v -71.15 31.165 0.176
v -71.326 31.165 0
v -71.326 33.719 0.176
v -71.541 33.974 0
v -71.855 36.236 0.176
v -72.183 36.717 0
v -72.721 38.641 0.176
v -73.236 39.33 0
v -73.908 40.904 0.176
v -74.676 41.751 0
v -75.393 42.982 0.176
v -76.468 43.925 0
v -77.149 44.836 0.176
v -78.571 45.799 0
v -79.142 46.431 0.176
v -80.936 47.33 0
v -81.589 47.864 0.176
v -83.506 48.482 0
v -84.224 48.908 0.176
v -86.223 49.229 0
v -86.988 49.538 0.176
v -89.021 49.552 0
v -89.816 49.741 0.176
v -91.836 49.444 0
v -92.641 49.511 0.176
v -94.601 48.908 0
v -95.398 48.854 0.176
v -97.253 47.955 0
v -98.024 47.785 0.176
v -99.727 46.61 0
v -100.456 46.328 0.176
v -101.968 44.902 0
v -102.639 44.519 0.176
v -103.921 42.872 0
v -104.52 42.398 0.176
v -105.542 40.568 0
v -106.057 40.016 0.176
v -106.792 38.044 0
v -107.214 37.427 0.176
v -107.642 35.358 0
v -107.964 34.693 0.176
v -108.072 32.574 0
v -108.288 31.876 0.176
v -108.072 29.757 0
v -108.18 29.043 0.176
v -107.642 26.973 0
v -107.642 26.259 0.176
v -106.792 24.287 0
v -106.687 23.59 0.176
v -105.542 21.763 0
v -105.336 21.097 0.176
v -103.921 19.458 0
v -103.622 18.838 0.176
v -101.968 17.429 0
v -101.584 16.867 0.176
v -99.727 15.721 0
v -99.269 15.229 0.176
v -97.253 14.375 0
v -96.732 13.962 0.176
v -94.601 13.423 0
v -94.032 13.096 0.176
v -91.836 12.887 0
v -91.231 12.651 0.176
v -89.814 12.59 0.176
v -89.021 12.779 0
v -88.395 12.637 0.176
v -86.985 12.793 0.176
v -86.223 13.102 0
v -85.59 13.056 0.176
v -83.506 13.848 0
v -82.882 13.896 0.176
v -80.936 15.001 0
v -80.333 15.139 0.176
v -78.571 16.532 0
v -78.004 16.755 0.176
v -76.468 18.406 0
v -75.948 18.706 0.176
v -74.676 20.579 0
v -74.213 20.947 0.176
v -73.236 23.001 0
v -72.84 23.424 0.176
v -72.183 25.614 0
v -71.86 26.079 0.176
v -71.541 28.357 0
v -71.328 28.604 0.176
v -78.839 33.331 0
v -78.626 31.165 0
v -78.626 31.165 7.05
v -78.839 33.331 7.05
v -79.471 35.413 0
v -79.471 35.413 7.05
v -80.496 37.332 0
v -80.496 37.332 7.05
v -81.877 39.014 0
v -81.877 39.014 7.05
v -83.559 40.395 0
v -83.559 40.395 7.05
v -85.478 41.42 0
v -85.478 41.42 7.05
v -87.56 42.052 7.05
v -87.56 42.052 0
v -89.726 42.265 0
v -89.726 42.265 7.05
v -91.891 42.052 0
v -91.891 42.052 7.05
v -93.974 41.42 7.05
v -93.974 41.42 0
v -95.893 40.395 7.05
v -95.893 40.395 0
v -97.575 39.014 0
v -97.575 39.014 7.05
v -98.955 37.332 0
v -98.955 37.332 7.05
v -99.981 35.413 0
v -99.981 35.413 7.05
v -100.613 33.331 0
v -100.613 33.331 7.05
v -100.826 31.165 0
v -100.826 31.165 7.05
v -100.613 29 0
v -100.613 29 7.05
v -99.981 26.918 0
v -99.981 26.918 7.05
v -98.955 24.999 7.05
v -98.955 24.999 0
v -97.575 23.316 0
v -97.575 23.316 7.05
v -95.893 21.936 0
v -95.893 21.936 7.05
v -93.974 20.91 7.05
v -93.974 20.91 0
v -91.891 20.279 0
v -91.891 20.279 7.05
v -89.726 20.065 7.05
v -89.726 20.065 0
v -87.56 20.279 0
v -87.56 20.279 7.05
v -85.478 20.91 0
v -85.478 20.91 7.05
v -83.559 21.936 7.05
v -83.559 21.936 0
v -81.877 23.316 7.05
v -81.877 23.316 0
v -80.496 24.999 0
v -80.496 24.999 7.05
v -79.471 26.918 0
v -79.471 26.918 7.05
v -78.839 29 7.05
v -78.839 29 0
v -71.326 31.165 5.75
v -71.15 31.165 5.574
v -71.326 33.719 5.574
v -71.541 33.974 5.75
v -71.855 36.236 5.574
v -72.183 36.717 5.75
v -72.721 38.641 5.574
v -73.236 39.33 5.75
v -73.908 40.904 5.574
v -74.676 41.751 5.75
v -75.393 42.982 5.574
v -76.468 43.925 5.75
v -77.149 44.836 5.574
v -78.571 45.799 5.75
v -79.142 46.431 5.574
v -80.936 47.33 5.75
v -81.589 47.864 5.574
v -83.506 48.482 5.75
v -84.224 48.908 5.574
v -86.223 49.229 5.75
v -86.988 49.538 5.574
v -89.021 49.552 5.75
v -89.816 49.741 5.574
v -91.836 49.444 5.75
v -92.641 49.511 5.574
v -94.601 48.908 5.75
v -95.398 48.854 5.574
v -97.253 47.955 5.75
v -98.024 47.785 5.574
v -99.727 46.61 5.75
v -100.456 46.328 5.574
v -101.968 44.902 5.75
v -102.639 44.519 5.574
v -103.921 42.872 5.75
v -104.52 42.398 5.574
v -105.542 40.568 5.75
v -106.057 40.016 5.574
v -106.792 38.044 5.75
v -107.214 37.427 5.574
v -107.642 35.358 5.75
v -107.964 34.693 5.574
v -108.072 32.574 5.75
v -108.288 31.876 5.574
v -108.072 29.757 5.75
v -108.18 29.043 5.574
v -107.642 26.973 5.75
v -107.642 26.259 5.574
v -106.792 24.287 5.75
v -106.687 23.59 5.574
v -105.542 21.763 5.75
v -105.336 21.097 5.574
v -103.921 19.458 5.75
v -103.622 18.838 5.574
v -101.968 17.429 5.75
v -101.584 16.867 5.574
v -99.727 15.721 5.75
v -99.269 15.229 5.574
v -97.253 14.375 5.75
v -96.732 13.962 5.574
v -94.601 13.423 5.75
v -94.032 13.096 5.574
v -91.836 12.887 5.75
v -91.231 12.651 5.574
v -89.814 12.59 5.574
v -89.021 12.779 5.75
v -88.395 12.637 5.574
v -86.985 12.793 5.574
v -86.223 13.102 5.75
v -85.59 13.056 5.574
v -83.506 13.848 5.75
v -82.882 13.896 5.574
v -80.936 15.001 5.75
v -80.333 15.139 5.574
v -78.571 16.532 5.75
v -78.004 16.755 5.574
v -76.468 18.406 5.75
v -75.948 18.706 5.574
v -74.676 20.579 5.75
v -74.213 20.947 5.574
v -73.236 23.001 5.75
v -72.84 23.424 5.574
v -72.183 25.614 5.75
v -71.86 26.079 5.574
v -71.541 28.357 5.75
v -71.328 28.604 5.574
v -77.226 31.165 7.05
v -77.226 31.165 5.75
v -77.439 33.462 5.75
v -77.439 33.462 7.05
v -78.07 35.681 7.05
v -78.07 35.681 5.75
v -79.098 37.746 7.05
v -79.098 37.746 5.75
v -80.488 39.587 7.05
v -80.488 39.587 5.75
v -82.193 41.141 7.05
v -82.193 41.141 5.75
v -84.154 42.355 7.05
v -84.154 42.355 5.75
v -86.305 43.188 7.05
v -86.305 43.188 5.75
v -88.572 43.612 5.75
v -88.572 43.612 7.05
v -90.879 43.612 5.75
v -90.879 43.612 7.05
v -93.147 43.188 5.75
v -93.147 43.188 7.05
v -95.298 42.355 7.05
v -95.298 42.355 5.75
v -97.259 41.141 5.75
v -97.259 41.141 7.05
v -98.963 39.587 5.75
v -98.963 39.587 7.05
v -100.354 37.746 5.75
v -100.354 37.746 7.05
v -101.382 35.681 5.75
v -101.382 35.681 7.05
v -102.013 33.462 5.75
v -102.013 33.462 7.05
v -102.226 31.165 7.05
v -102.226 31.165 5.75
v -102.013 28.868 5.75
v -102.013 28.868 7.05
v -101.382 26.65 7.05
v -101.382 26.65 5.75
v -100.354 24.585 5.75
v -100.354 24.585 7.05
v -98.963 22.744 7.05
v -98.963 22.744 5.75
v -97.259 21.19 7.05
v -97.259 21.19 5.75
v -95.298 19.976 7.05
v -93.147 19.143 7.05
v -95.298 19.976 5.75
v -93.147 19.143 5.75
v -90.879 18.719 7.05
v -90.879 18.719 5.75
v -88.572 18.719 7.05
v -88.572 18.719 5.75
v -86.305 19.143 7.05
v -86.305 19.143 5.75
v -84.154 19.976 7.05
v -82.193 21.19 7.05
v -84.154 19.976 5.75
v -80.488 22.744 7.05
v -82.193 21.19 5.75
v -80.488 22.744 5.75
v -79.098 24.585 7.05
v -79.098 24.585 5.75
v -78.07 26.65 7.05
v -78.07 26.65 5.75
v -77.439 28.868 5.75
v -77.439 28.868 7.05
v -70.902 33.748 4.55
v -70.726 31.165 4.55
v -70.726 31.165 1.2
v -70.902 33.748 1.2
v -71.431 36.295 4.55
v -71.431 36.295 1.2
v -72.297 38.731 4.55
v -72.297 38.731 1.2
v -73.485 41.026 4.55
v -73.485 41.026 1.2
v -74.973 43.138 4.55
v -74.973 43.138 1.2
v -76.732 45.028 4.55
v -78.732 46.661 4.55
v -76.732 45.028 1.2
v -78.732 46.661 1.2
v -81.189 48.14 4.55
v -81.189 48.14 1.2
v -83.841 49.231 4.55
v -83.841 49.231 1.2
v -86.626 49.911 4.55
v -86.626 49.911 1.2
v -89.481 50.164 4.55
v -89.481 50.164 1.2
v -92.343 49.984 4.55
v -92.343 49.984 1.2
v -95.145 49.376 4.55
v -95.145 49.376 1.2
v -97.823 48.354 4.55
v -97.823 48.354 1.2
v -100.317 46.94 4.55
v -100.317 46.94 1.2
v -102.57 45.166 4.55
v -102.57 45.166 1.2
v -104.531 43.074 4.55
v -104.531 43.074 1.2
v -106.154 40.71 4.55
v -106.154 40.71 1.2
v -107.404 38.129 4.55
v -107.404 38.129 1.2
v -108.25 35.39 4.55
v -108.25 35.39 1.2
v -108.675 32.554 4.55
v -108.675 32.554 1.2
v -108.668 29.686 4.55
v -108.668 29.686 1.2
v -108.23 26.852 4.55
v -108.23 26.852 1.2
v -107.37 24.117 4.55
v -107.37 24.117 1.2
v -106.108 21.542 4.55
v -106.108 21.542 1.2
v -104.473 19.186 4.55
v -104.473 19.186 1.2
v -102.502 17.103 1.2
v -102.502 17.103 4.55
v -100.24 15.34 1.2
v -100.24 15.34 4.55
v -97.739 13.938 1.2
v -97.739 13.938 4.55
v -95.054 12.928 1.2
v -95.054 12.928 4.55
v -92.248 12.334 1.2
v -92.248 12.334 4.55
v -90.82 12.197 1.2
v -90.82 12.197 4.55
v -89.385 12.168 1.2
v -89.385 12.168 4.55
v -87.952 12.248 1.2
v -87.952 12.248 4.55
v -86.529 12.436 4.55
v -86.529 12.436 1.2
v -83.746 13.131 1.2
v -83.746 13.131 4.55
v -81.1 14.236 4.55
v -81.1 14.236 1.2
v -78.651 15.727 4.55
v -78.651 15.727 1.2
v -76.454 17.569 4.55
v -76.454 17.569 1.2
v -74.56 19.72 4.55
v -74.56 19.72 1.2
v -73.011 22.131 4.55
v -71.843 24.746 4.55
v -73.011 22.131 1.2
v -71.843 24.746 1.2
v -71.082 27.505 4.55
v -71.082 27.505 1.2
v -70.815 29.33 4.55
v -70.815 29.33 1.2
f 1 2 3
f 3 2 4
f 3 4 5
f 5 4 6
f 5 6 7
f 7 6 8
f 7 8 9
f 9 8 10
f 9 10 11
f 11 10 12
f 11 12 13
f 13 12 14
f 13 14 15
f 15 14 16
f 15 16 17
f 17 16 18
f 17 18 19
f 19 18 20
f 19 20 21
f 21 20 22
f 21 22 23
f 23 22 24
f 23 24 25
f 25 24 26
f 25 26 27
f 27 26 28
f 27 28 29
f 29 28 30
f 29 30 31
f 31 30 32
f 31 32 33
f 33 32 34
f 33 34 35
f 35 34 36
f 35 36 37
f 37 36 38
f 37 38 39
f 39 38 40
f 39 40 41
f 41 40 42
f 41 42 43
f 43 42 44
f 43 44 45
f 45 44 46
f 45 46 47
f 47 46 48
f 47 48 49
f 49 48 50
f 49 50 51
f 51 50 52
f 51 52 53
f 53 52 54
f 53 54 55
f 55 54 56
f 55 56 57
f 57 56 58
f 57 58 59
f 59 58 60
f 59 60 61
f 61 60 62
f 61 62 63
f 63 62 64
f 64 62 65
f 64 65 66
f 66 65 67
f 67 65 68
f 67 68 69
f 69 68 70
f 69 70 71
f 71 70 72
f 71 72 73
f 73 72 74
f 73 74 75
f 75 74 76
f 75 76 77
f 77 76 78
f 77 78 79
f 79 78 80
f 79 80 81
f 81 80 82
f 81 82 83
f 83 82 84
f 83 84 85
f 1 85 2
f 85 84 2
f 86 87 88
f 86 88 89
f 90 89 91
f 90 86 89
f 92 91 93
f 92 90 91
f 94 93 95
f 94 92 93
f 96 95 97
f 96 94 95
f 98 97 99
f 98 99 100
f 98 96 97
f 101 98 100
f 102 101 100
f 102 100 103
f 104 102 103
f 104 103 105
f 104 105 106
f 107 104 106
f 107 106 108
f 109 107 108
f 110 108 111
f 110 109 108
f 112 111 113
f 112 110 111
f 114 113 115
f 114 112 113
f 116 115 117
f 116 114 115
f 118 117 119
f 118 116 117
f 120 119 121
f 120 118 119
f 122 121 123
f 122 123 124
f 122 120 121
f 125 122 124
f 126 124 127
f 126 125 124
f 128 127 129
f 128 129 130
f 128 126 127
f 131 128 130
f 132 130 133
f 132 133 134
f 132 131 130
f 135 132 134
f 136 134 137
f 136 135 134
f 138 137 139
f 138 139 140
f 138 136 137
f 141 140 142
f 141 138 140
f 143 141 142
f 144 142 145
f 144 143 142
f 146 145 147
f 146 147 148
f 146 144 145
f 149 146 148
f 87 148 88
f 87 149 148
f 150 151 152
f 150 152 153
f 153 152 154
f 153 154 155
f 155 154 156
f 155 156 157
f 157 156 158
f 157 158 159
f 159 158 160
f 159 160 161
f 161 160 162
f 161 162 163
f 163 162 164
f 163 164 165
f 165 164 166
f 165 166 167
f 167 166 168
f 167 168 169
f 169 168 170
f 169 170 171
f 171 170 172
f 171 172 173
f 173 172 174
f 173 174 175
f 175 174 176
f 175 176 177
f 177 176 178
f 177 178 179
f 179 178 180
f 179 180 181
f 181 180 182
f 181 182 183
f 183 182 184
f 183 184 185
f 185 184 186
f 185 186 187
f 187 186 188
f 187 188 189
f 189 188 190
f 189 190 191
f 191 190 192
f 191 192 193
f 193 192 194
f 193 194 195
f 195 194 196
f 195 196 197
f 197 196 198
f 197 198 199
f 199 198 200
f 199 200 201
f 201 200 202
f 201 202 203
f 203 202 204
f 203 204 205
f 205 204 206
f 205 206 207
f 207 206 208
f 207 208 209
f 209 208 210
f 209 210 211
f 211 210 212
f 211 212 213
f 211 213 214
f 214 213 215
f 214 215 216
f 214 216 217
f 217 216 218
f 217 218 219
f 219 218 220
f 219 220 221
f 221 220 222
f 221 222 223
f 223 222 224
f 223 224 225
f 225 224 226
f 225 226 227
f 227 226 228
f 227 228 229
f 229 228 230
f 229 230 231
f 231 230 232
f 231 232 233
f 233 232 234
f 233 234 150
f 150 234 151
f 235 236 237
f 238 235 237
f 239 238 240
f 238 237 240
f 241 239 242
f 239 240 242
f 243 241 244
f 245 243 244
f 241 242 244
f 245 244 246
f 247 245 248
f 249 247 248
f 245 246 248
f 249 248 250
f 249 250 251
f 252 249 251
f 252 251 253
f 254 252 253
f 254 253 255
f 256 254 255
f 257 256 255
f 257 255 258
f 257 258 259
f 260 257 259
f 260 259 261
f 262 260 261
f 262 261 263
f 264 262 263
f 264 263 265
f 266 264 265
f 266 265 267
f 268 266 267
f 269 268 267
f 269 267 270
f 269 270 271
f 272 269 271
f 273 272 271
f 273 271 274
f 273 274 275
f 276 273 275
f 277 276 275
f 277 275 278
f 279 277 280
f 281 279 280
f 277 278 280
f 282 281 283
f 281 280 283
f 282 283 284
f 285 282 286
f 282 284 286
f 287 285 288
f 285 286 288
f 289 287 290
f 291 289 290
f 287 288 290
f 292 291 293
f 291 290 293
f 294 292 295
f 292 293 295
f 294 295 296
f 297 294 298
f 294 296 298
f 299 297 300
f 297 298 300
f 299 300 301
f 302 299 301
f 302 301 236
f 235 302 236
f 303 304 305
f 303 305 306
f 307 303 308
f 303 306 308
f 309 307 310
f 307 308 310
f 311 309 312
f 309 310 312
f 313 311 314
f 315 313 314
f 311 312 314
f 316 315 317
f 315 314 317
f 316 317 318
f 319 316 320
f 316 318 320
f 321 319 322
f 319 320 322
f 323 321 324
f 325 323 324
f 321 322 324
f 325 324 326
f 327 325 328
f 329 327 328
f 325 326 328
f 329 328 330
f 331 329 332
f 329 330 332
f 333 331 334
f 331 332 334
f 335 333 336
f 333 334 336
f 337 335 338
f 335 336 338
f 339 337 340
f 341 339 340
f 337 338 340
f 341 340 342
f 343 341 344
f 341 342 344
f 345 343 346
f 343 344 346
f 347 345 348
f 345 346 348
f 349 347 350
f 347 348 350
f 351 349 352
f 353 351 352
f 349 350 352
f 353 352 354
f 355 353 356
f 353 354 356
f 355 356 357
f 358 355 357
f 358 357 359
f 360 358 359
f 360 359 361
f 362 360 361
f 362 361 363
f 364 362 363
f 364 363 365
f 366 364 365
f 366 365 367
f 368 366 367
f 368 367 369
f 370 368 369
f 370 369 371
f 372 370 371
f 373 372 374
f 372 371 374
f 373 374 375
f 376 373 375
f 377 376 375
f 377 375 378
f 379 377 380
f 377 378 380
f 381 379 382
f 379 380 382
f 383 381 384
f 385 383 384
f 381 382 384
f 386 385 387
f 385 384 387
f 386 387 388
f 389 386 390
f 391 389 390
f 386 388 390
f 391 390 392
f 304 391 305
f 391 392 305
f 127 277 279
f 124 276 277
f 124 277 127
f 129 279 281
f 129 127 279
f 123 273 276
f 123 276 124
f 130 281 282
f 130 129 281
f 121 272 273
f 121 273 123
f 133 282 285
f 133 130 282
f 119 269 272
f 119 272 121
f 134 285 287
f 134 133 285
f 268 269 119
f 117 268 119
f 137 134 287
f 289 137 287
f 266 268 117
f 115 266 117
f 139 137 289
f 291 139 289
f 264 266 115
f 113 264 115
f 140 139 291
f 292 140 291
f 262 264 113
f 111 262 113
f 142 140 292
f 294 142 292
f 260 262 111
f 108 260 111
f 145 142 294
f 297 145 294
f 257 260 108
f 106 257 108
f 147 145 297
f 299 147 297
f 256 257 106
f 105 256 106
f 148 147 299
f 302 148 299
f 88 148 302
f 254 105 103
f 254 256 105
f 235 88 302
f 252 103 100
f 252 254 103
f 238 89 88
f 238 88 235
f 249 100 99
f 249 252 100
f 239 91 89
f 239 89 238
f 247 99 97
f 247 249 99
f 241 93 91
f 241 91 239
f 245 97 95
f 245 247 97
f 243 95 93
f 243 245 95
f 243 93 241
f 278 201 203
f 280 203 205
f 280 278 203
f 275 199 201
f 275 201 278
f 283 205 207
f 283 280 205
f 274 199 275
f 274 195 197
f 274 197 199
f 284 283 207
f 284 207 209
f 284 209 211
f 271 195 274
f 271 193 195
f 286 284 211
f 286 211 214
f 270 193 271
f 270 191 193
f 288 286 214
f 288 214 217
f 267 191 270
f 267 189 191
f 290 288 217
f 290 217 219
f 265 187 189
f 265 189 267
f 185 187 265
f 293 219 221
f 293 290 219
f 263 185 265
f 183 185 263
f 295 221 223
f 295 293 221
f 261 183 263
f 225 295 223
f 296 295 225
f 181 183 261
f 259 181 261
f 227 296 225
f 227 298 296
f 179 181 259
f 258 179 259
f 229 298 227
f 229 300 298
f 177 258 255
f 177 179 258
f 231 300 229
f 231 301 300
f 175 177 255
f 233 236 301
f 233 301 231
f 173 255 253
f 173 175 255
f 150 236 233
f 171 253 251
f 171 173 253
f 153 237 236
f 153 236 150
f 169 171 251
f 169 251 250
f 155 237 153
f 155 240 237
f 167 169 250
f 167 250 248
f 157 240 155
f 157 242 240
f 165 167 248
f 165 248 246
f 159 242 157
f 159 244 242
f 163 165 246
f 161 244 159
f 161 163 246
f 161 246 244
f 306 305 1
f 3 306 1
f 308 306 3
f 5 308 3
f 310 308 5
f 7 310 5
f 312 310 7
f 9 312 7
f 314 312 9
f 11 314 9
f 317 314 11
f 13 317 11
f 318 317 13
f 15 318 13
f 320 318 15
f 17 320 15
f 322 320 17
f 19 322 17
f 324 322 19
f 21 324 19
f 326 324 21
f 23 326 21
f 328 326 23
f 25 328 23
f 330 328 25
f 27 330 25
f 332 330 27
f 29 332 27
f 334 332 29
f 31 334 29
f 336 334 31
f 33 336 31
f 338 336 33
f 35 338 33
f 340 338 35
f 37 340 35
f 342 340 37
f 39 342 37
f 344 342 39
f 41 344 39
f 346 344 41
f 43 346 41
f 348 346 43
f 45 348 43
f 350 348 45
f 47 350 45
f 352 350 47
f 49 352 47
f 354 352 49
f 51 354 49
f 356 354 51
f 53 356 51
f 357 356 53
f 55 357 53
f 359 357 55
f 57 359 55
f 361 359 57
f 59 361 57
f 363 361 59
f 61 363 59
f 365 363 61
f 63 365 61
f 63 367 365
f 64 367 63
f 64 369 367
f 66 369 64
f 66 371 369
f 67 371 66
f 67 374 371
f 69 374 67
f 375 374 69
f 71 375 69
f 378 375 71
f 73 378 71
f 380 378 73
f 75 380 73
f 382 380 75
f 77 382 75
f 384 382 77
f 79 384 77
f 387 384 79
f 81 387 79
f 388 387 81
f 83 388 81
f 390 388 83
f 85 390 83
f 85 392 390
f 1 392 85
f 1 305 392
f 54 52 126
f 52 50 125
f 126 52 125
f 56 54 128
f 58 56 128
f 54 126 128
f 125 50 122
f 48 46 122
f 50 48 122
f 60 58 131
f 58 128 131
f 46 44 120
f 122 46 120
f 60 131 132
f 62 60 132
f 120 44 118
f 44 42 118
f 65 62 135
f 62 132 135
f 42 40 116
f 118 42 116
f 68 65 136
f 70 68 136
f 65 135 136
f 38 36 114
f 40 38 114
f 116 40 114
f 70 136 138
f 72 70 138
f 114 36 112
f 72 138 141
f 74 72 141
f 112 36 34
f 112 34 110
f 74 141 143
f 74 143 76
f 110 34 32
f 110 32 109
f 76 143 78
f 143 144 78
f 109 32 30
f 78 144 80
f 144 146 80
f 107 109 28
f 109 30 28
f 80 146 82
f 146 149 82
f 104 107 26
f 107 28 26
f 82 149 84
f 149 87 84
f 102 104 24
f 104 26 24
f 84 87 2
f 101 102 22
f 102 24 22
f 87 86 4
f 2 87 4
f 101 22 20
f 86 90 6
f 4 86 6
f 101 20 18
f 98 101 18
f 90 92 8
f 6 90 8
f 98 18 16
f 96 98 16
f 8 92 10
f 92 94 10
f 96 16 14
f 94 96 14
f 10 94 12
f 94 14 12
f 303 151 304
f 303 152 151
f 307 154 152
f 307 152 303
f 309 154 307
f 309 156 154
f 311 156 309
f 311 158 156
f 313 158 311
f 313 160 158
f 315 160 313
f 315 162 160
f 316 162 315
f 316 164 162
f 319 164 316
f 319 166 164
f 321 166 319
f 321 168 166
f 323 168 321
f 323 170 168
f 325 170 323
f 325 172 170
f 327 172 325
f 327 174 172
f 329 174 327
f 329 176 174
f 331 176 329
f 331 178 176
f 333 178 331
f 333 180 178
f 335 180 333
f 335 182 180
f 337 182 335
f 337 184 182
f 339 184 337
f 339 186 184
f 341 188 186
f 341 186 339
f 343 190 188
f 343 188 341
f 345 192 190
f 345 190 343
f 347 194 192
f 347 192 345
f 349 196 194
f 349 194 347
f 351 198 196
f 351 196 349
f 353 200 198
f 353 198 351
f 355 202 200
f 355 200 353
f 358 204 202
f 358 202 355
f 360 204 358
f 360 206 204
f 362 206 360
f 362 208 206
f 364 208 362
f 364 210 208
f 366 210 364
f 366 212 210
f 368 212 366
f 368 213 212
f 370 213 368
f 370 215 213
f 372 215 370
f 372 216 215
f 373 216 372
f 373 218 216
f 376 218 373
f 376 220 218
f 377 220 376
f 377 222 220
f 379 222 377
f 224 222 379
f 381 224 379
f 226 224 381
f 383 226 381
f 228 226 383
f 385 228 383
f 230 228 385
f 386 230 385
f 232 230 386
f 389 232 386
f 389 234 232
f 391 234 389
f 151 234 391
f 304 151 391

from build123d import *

# Parameters (mm, degrees)
F0_R     = 19
F0_R_2   = 12.5
F1_DEPTH = 5.75
F0_R_3   = 11.1
F2_DEPTH = 7.05
F3_SIZE  = 0.6
F4_SIZE  = 0.6


with BuildPart() as f1:
    # F0 (on Top) → F1 (new body)
    with BuildSketch(Plane.XY):
        with Locations((-89.7258073092, 31.1653446406)):
            Circle(F0_R)
        with Locations((-89.7258073092, 31.1653446406)):
            Circle(F0_R_2, mode=Mode.SUBTRACT)
    extrude(amount=F1_DEPTH)

    # F0 (on Top) → F2 (join)
    with BuildSketch(Plane.XY):
        with Locations((-89.7258073092, 31.1653446406)):
            Circle(F0_R_2)
        with Locations((-89.7258073092, 31.1653446406)):
            Circle(F0_R_3, mode=Mode.SUBTRACT)
    extrude(amount=F2_DEPTH)

    # F3
    f3_edges = [f1.edges().sort_by_distance(p)[0] for p in [
        (-108.725807, 31.165345, 5.75),
        (-108.725807, 31.165345, 0),
    ]]
    chamfer(f3_edges, length=F3_SIZE)

    # F4
    f4_edges = [f1.edges().sort_by_distance(p)[0] for p in [
        (-108.725807, 31.165345, 5.15),
        (-108.725807, 31.165345, 0.6),
    ]]
    chamfer(f4_edges, length=F4_SIZE)


solid = f1.part
